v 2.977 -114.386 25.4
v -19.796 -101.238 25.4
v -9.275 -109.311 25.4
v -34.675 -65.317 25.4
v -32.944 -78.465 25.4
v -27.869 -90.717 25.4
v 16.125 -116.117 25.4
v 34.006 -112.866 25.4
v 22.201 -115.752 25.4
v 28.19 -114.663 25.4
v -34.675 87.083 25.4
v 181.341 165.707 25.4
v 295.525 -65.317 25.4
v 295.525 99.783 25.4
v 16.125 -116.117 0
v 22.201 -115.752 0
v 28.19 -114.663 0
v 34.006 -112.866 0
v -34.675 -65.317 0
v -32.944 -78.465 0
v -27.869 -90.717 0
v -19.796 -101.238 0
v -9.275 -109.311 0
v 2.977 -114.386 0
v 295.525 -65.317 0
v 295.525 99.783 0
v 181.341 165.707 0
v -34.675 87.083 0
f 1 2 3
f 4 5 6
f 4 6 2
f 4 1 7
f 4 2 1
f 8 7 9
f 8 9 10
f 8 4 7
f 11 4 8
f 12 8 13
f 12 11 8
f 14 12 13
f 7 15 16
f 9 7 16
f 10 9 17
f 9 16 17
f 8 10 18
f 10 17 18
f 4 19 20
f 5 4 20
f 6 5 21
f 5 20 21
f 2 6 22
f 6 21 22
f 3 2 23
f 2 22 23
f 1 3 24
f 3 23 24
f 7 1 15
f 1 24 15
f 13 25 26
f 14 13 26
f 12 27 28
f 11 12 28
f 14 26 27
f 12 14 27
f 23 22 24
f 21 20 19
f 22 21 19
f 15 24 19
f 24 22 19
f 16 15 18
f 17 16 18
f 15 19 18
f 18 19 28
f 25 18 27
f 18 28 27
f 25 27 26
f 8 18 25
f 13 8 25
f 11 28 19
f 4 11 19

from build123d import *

# Parameters (mm, degrees)
F1_DEPTH = 25.4


with BuildPart() as f1:
    # F0 (on Top) → F1 (new body)
    with BuildSketch(Plane.XY):
        with BuildLine():
            Line((34.00621, -112.865897), (295.52461, -65.317097))
            Line((295.52461, -65.317097), (295.52461, 99.782903))
            Line((295.52461, 99.782903), (181.341427, 165.706594))
            Line((181.341427, 165.706594), (-34.67539, 87.082903))
            Line((-34.67539, 87.082903), (-34.67539, -65.317097))
            ThreePointArc((-34.67539, -65.317097), (-19.796415, -101.238122), (16.12461, -116.117097))
            Line((16.12461, -116.117097), (34.00621, -112.865897))
        make_face()
        with BuildLine():
            ThreePointArc((16.12461, -116.117097), (25.21199, -115.297689), (34.00621, -112.865897))
            Line((34.00621, -112.865897), (16.12461, -116.117097))
        make_face()
    extrude(amount=F1_DEPTH)


solid = f1.part
